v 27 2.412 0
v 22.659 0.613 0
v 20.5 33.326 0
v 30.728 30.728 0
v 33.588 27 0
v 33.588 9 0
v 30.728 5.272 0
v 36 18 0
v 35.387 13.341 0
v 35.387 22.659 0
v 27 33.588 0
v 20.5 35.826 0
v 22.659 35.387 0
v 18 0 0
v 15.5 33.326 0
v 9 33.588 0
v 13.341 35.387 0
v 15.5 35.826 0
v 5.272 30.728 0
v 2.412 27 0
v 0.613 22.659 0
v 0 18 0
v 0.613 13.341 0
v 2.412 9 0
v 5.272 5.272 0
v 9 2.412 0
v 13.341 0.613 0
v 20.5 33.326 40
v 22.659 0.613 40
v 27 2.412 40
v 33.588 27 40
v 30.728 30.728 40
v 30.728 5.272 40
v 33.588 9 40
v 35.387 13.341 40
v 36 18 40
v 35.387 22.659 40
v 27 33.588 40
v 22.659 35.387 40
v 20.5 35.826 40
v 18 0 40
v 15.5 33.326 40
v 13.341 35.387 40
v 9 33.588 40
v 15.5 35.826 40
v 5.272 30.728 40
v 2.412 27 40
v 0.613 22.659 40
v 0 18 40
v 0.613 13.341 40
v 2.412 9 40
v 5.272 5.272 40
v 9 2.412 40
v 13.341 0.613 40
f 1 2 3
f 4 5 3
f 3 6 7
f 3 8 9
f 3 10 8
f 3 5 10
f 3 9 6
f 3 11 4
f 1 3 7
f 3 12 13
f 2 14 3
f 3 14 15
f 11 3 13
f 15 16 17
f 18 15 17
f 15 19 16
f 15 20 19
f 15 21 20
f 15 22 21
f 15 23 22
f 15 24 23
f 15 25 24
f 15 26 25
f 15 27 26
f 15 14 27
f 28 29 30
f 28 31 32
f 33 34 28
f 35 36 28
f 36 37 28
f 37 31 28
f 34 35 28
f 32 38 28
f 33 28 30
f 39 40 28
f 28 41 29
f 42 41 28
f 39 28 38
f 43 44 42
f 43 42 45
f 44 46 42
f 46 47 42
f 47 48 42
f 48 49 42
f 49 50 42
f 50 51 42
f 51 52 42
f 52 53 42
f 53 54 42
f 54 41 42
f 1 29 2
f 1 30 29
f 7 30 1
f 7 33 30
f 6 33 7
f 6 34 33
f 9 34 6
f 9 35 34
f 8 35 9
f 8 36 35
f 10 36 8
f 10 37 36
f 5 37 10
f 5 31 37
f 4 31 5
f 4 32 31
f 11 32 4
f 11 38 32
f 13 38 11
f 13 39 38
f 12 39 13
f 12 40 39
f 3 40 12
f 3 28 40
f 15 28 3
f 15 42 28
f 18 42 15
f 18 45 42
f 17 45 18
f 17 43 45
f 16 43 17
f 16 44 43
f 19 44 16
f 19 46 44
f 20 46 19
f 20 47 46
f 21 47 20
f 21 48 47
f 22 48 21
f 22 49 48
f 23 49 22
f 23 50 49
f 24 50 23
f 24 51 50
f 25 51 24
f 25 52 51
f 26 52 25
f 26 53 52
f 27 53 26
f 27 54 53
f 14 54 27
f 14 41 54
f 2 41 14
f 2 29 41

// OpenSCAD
$fn = 32;

// ----------------------------------------------------------------------
// Keyway shaft: d36 shaft, key 5 x 2.5 mm
// ----------------------------------------------------------------------

// --- parameters (mm) ---
shaft_r = 18;             // shaft radius
key_w = 5;                // keyway width
key_d = 2.5;              // keyway depth below the surface line
plate_t = 40;             // shaft length, Z (extrusion height)

shaft_d = 2 * shaft_r;  // shaft diameter
circle_step = 15;  // polygon sampling step, degrees

profile = [[13.341, 35.387], [9, 33.588], [5.272, 30.728], [2.412, 27], [0.613, 22.659], [0, 18], [0.613, 13.341], [2.412, 9], [5.272, 5.272], [9, 2.412], [13.341, 0.613], [18, 0], [22.659, 0.613], [27, 2.412], [30.728, 5.272], [33.588, 9], [35.387, 13.341], [36, 18], [35.387, 22.659], [33.588, 27], [30.728, 30.728], [27, 33.588], [22.659, 35.387], [20.5, 35.826], [20.5, 33.326], [15.5, 33.326], [15.5, 35.826]];  // primary outline, 27 points, counter clockwise

// --- the one profile operation ---
linear_extrude(height = plate_t) polygon(points = profile);
